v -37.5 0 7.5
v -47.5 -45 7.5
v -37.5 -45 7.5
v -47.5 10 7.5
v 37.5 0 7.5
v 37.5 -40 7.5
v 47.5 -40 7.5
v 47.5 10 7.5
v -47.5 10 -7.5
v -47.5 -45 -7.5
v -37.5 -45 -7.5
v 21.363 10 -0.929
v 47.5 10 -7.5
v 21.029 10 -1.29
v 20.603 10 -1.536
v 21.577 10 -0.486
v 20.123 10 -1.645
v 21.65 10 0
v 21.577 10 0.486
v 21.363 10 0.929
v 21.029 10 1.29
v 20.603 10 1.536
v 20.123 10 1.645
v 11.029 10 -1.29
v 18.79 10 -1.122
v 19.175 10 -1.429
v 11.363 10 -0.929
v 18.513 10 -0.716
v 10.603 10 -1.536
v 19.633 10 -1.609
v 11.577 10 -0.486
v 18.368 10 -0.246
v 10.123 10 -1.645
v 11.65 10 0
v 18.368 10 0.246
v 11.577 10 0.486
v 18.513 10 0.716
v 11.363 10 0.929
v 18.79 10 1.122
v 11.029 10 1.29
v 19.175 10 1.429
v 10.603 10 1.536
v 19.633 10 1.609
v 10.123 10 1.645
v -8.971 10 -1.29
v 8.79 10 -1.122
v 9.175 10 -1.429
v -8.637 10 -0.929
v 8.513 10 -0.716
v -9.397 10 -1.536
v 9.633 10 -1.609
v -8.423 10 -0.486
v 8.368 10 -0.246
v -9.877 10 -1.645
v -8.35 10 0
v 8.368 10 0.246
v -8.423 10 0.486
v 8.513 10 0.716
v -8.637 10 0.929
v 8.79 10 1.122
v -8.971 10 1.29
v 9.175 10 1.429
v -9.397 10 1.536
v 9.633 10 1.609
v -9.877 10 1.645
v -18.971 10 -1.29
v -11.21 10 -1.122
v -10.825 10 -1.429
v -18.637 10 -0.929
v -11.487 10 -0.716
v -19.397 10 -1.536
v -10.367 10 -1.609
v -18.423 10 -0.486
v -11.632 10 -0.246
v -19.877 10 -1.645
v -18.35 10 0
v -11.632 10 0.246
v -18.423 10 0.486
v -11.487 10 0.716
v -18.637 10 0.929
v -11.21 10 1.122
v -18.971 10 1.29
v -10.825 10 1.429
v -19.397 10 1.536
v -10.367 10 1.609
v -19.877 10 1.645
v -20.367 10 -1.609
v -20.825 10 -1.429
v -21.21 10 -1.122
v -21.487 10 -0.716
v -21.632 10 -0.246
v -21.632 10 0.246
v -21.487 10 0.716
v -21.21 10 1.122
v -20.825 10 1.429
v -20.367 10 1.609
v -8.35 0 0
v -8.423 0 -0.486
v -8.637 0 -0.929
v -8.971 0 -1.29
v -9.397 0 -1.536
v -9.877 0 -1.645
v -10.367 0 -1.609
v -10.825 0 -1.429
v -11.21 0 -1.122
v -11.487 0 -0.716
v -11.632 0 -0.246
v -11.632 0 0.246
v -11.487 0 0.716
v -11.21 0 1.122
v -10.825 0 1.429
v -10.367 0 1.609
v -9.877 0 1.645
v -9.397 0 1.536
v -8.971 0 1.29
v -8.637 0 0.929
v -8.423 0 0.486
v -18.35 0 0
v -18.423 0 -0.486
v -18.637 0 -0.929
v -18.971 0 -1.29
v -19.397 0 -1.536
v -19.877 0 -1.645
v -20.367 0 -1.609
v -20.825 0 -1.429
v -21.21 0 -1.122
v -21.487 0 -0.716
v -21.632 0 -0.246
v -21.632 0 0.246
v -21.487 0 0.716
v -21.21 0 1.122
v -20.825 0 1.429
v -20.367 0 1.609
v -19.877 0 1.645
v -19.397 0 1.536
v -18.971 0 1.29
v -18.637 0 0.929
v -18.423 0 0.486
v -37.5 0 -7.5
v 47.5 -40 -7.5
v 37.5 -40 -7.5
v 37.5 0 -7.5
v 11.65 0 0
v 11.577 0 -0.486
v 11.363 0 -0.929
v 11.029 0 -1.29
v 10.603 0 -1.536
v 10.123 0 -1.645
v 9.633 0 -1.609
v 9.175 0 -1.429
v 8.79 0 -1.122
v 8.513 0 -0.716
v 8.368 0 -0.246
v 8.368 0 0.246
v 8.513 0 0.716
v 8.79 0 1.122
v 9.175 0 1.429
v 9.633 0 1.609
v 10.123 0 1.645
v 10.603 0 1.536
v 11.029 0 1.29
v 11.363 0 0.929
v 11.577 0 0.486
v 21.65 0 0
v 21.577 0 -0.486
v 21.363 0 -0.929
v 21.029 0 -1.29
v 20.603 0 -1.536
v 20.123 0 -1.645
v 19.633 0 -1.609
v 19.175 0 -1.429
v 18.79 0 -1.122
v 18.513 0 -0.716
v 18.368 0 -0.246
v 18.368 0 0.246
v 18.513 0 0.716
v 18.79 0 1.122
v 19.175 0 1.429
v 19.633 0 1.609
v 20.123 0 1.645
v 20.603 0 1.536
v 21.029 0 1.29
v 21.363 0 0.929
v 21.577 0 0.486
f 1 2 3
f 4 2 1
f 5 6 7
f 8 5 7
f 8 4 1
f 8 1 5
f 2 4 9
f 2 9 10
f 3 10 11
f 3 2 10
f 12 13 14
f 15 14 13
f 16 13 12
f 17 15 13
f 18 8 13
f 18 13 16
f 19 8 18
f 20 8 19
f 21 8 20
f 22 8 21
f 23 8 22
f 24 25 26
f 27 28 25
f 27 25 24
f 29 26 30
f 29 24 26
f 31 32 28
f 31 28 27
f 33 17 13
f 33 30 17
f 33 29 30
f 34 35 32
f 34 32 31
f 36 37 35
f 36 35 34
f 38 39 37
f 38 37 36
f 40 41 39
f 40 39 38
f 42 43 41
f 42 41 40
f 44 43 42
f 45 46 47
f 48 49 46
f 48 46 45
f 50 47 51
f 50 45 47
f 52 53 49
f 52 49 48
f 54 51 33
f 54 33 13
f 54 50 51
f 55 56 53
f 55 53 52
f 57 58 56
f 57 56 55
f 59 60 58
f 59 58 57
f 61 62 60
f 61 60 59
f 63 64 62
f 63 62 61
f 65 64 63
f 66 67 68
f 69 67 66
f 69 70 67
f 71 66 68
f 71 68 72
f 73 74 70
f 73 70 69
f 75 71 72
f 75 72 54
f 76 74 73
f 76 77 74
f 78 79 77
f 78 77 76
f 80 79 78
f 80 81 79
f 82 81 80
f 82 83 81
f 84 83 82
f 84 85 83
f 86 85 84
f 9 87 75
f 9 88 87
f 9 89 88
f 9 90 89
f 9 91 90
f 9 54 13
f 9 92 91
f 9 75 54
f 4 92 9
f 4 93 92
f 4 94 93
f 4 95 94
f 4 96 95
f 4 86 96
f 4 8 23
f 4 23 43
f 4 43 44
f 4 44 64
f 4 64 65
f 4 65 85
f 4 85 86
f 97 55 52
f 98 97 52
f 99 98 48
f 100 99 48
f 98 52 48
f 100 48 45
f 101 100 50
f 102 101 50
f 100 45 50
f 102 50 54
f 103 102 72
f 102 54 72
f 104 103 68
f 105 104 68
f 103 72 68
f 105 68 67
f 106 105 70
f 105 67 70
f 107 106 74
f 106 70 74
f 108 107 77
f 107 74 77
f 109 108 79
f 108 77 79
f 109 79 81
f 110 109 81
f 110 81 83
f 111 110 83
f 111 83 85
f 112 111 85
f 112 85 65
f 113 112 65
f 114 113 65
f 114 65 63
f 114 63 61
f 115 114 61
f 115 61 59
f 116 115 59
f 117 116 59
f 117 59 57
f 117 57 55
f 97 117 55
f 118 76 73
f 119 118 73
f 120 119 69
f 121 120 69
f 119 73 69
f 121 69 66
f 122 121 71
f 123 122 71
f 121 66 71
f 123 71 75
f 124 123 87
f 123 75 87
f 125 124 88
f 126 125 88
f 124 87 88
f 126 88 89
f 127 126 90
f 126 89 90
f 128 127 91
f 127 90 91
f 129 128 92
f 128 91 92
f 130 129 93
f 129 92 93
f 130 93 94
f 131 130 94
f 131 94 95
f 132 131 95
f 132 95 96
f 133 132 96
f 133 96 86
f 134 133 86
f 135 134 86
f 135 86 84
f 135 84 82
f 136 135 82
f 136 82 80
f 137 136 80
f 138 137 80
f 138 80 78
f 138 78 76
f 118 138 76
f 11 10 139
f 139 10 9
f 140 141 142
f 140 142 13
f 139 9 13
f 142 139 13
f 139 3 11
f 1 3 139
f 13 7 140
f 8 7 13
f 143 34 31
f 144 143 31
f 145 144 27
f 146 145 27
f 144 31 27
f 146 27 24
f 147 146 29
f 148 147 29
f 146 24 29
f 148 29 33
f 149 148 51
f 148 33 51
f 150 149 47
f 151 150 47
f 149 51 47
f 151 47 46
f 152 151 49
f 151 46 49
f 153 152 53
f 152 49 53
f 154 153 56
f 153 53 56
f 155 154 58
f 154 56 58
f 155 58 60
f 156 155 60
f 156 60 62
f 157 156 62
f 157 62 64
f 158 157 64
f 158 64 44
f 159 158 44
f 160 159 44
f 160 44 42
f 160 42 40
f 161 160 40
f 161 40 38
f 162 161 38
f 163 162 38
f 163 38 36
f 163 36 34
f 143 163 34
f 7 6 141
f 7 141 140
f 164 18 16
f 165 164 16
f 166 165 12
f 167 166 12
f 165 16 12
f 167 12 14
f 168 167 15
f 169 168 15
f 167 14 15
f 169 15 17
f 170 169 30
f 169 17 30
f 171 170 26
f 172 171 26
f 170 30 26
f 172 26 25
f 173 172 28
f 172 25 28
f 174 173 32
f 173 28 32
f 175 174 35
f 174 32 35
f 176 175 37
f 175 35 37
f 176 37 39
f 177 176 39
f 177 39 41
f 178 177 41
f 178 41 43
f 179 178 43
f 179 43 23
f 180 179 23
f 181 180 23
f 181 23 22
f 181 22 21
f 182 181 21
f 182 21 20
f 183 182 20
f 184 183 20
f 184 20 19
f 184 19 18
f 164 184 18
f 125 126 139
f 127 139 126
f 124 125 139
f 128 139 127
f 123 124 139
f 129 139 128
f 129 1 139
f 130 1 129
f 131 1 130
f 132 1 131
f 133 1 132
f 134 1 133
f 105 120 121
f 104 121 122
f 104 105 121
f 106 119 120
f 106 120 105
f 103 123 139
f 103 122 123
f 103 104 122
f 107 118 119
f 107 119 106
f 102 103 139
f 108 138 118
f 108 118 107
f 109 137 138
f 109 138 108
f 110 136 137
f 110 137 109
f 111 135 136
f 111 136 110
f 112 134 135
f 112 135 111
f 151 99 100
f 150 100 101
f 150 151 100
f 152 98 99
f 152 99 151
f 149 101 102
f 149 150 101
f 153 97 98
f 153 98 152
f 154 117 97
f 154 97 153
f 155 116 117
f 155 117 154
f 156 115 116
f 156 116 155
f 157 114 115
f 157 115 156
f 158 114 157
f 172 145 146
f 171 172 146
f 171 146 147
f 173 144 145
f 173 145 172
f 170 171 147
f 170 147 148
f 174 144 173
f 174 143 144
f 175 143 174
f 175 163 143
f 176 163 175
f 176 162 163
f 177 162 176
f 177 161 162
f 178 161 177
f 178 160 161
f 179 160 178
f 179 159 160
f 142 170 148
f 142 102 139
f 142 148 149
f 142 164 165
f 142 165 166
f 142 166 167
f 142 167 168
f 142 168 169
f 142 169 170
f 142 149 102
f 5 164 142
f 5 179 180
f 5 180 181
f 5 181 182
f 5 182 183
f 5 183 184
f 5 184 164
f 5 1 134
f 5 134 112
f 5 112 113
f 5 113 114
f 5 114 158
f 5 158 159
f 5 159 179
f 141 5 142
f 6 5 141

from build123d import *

# Parameters (mm, degrees)
BOSS_EXTRUDE1_DEPTH = 7.5
CUT_EXTRUDE1_REACH  = 57
SKETCH2_R           = 1.65


with BuildPart() as part:
    # Sketch1 → Boss-Extrude1 (new body, symmetric)
    with BuildSketch(Plane.XY):
        Polygon((-37.5, 0), (37.5, 0), (37.5, -40), (47.5, -40), (47.5, 10), (-47.5, 10), (-47.5, -45), (-37.5, -45), align=None)
    extrude(amount=BOSS_EXTRUDE1_DEPTH, both=True)

    # Sketch2 → Cut-Extrude1 (cut, up to next)
    with BuildSketch(Plane(origin=(0, 10, 0), x_dir=(1, 0, 0), z_dir=(0, 1, 0)), mode=Mode.PRIVATE) as cut_extrude1_sk1:
        with Locations((-10, 0)):
            Circle(SKETCH2_R)
    cut_extrude1_tool1 = extrude(cut_extrude1_sk1.sketch, amount=-CUT_EXTRUDE1_REACH, mode=Mode.PRIVATE) & part.part
    add(cut_extrude1_tool1.solids().sort_by_distance((-10, 10, 0))[0], mode=Mode.SUBTRACT)
    # Sketch2 → Cut-Extrude1 (cut, up to next)
    with BuildSketch(Plane(origin=(0, 10, 0), x_dir=(1, 0, 0), z_dir=(0, 1, 0)), mode=Mode.PRIVATE) as cut_extrude1_sk2:
        with Locations((10, 0)):
            Circle(SKETCH2_R)
    cut_extrude1_tool2 = extrude(cut_extrude1_sk2.sketch, amount=-CUT_EXTRUDE1_REACH, mode=Mode.PRIVATE) & part.part
    add(cut_extrude1_tool2.solids().sort_by_distance((10, 10, 0))[0], mode=Mode.SUBTRACT)
    # Sketch2 → Cut-Extrude1 (cut, up to next)
    with BuildSketch(Plane(origin=(0, 10, 0), x_dir=(1, 0, 0), z_dir=(0, 1, 0)), mode=Mode.PRIVATE) as cut_extrude1_sk3:
        with Locations((20, 0)):
            Circle(SKETCH2_R)
    cut_extrude1_tool3 = extrude(cut_extrude1_sk3.sketch, amount=-CUT_EXTRUDE1_REACH, mode=Mode.PRIVATE) & part.part
    add(cut_extrude1_tool3.solids().sort_by_distance((20, 10, 0))[0], mode=Mode.SUBTRACT)
    # Sketch2 → Cut-Extrude1 (cut, up to next)
    with BuildSketch(Plane(origin=(0, 10, 0), x_dir=(1, 0, 0), z_dir=(0, 1, 0)), mode=Mode.PRIVATE) as cut_extrude1_sk4:
        with Locations((-20, 0)):
            Circle(SKETCH2_R)
    cut_extrude1_tool4 = extrude(cut_extrude1_sk4.sketch, amount=-CUT_EXTRUDE1_REACH, mode=Mode.PRIVATE) & part.part
    add(cut_extrude1_tool4.solids().sort_by_distance((-20, 10, 0))[0], mode=Mode.SUBTRACT)


solid = part.part
